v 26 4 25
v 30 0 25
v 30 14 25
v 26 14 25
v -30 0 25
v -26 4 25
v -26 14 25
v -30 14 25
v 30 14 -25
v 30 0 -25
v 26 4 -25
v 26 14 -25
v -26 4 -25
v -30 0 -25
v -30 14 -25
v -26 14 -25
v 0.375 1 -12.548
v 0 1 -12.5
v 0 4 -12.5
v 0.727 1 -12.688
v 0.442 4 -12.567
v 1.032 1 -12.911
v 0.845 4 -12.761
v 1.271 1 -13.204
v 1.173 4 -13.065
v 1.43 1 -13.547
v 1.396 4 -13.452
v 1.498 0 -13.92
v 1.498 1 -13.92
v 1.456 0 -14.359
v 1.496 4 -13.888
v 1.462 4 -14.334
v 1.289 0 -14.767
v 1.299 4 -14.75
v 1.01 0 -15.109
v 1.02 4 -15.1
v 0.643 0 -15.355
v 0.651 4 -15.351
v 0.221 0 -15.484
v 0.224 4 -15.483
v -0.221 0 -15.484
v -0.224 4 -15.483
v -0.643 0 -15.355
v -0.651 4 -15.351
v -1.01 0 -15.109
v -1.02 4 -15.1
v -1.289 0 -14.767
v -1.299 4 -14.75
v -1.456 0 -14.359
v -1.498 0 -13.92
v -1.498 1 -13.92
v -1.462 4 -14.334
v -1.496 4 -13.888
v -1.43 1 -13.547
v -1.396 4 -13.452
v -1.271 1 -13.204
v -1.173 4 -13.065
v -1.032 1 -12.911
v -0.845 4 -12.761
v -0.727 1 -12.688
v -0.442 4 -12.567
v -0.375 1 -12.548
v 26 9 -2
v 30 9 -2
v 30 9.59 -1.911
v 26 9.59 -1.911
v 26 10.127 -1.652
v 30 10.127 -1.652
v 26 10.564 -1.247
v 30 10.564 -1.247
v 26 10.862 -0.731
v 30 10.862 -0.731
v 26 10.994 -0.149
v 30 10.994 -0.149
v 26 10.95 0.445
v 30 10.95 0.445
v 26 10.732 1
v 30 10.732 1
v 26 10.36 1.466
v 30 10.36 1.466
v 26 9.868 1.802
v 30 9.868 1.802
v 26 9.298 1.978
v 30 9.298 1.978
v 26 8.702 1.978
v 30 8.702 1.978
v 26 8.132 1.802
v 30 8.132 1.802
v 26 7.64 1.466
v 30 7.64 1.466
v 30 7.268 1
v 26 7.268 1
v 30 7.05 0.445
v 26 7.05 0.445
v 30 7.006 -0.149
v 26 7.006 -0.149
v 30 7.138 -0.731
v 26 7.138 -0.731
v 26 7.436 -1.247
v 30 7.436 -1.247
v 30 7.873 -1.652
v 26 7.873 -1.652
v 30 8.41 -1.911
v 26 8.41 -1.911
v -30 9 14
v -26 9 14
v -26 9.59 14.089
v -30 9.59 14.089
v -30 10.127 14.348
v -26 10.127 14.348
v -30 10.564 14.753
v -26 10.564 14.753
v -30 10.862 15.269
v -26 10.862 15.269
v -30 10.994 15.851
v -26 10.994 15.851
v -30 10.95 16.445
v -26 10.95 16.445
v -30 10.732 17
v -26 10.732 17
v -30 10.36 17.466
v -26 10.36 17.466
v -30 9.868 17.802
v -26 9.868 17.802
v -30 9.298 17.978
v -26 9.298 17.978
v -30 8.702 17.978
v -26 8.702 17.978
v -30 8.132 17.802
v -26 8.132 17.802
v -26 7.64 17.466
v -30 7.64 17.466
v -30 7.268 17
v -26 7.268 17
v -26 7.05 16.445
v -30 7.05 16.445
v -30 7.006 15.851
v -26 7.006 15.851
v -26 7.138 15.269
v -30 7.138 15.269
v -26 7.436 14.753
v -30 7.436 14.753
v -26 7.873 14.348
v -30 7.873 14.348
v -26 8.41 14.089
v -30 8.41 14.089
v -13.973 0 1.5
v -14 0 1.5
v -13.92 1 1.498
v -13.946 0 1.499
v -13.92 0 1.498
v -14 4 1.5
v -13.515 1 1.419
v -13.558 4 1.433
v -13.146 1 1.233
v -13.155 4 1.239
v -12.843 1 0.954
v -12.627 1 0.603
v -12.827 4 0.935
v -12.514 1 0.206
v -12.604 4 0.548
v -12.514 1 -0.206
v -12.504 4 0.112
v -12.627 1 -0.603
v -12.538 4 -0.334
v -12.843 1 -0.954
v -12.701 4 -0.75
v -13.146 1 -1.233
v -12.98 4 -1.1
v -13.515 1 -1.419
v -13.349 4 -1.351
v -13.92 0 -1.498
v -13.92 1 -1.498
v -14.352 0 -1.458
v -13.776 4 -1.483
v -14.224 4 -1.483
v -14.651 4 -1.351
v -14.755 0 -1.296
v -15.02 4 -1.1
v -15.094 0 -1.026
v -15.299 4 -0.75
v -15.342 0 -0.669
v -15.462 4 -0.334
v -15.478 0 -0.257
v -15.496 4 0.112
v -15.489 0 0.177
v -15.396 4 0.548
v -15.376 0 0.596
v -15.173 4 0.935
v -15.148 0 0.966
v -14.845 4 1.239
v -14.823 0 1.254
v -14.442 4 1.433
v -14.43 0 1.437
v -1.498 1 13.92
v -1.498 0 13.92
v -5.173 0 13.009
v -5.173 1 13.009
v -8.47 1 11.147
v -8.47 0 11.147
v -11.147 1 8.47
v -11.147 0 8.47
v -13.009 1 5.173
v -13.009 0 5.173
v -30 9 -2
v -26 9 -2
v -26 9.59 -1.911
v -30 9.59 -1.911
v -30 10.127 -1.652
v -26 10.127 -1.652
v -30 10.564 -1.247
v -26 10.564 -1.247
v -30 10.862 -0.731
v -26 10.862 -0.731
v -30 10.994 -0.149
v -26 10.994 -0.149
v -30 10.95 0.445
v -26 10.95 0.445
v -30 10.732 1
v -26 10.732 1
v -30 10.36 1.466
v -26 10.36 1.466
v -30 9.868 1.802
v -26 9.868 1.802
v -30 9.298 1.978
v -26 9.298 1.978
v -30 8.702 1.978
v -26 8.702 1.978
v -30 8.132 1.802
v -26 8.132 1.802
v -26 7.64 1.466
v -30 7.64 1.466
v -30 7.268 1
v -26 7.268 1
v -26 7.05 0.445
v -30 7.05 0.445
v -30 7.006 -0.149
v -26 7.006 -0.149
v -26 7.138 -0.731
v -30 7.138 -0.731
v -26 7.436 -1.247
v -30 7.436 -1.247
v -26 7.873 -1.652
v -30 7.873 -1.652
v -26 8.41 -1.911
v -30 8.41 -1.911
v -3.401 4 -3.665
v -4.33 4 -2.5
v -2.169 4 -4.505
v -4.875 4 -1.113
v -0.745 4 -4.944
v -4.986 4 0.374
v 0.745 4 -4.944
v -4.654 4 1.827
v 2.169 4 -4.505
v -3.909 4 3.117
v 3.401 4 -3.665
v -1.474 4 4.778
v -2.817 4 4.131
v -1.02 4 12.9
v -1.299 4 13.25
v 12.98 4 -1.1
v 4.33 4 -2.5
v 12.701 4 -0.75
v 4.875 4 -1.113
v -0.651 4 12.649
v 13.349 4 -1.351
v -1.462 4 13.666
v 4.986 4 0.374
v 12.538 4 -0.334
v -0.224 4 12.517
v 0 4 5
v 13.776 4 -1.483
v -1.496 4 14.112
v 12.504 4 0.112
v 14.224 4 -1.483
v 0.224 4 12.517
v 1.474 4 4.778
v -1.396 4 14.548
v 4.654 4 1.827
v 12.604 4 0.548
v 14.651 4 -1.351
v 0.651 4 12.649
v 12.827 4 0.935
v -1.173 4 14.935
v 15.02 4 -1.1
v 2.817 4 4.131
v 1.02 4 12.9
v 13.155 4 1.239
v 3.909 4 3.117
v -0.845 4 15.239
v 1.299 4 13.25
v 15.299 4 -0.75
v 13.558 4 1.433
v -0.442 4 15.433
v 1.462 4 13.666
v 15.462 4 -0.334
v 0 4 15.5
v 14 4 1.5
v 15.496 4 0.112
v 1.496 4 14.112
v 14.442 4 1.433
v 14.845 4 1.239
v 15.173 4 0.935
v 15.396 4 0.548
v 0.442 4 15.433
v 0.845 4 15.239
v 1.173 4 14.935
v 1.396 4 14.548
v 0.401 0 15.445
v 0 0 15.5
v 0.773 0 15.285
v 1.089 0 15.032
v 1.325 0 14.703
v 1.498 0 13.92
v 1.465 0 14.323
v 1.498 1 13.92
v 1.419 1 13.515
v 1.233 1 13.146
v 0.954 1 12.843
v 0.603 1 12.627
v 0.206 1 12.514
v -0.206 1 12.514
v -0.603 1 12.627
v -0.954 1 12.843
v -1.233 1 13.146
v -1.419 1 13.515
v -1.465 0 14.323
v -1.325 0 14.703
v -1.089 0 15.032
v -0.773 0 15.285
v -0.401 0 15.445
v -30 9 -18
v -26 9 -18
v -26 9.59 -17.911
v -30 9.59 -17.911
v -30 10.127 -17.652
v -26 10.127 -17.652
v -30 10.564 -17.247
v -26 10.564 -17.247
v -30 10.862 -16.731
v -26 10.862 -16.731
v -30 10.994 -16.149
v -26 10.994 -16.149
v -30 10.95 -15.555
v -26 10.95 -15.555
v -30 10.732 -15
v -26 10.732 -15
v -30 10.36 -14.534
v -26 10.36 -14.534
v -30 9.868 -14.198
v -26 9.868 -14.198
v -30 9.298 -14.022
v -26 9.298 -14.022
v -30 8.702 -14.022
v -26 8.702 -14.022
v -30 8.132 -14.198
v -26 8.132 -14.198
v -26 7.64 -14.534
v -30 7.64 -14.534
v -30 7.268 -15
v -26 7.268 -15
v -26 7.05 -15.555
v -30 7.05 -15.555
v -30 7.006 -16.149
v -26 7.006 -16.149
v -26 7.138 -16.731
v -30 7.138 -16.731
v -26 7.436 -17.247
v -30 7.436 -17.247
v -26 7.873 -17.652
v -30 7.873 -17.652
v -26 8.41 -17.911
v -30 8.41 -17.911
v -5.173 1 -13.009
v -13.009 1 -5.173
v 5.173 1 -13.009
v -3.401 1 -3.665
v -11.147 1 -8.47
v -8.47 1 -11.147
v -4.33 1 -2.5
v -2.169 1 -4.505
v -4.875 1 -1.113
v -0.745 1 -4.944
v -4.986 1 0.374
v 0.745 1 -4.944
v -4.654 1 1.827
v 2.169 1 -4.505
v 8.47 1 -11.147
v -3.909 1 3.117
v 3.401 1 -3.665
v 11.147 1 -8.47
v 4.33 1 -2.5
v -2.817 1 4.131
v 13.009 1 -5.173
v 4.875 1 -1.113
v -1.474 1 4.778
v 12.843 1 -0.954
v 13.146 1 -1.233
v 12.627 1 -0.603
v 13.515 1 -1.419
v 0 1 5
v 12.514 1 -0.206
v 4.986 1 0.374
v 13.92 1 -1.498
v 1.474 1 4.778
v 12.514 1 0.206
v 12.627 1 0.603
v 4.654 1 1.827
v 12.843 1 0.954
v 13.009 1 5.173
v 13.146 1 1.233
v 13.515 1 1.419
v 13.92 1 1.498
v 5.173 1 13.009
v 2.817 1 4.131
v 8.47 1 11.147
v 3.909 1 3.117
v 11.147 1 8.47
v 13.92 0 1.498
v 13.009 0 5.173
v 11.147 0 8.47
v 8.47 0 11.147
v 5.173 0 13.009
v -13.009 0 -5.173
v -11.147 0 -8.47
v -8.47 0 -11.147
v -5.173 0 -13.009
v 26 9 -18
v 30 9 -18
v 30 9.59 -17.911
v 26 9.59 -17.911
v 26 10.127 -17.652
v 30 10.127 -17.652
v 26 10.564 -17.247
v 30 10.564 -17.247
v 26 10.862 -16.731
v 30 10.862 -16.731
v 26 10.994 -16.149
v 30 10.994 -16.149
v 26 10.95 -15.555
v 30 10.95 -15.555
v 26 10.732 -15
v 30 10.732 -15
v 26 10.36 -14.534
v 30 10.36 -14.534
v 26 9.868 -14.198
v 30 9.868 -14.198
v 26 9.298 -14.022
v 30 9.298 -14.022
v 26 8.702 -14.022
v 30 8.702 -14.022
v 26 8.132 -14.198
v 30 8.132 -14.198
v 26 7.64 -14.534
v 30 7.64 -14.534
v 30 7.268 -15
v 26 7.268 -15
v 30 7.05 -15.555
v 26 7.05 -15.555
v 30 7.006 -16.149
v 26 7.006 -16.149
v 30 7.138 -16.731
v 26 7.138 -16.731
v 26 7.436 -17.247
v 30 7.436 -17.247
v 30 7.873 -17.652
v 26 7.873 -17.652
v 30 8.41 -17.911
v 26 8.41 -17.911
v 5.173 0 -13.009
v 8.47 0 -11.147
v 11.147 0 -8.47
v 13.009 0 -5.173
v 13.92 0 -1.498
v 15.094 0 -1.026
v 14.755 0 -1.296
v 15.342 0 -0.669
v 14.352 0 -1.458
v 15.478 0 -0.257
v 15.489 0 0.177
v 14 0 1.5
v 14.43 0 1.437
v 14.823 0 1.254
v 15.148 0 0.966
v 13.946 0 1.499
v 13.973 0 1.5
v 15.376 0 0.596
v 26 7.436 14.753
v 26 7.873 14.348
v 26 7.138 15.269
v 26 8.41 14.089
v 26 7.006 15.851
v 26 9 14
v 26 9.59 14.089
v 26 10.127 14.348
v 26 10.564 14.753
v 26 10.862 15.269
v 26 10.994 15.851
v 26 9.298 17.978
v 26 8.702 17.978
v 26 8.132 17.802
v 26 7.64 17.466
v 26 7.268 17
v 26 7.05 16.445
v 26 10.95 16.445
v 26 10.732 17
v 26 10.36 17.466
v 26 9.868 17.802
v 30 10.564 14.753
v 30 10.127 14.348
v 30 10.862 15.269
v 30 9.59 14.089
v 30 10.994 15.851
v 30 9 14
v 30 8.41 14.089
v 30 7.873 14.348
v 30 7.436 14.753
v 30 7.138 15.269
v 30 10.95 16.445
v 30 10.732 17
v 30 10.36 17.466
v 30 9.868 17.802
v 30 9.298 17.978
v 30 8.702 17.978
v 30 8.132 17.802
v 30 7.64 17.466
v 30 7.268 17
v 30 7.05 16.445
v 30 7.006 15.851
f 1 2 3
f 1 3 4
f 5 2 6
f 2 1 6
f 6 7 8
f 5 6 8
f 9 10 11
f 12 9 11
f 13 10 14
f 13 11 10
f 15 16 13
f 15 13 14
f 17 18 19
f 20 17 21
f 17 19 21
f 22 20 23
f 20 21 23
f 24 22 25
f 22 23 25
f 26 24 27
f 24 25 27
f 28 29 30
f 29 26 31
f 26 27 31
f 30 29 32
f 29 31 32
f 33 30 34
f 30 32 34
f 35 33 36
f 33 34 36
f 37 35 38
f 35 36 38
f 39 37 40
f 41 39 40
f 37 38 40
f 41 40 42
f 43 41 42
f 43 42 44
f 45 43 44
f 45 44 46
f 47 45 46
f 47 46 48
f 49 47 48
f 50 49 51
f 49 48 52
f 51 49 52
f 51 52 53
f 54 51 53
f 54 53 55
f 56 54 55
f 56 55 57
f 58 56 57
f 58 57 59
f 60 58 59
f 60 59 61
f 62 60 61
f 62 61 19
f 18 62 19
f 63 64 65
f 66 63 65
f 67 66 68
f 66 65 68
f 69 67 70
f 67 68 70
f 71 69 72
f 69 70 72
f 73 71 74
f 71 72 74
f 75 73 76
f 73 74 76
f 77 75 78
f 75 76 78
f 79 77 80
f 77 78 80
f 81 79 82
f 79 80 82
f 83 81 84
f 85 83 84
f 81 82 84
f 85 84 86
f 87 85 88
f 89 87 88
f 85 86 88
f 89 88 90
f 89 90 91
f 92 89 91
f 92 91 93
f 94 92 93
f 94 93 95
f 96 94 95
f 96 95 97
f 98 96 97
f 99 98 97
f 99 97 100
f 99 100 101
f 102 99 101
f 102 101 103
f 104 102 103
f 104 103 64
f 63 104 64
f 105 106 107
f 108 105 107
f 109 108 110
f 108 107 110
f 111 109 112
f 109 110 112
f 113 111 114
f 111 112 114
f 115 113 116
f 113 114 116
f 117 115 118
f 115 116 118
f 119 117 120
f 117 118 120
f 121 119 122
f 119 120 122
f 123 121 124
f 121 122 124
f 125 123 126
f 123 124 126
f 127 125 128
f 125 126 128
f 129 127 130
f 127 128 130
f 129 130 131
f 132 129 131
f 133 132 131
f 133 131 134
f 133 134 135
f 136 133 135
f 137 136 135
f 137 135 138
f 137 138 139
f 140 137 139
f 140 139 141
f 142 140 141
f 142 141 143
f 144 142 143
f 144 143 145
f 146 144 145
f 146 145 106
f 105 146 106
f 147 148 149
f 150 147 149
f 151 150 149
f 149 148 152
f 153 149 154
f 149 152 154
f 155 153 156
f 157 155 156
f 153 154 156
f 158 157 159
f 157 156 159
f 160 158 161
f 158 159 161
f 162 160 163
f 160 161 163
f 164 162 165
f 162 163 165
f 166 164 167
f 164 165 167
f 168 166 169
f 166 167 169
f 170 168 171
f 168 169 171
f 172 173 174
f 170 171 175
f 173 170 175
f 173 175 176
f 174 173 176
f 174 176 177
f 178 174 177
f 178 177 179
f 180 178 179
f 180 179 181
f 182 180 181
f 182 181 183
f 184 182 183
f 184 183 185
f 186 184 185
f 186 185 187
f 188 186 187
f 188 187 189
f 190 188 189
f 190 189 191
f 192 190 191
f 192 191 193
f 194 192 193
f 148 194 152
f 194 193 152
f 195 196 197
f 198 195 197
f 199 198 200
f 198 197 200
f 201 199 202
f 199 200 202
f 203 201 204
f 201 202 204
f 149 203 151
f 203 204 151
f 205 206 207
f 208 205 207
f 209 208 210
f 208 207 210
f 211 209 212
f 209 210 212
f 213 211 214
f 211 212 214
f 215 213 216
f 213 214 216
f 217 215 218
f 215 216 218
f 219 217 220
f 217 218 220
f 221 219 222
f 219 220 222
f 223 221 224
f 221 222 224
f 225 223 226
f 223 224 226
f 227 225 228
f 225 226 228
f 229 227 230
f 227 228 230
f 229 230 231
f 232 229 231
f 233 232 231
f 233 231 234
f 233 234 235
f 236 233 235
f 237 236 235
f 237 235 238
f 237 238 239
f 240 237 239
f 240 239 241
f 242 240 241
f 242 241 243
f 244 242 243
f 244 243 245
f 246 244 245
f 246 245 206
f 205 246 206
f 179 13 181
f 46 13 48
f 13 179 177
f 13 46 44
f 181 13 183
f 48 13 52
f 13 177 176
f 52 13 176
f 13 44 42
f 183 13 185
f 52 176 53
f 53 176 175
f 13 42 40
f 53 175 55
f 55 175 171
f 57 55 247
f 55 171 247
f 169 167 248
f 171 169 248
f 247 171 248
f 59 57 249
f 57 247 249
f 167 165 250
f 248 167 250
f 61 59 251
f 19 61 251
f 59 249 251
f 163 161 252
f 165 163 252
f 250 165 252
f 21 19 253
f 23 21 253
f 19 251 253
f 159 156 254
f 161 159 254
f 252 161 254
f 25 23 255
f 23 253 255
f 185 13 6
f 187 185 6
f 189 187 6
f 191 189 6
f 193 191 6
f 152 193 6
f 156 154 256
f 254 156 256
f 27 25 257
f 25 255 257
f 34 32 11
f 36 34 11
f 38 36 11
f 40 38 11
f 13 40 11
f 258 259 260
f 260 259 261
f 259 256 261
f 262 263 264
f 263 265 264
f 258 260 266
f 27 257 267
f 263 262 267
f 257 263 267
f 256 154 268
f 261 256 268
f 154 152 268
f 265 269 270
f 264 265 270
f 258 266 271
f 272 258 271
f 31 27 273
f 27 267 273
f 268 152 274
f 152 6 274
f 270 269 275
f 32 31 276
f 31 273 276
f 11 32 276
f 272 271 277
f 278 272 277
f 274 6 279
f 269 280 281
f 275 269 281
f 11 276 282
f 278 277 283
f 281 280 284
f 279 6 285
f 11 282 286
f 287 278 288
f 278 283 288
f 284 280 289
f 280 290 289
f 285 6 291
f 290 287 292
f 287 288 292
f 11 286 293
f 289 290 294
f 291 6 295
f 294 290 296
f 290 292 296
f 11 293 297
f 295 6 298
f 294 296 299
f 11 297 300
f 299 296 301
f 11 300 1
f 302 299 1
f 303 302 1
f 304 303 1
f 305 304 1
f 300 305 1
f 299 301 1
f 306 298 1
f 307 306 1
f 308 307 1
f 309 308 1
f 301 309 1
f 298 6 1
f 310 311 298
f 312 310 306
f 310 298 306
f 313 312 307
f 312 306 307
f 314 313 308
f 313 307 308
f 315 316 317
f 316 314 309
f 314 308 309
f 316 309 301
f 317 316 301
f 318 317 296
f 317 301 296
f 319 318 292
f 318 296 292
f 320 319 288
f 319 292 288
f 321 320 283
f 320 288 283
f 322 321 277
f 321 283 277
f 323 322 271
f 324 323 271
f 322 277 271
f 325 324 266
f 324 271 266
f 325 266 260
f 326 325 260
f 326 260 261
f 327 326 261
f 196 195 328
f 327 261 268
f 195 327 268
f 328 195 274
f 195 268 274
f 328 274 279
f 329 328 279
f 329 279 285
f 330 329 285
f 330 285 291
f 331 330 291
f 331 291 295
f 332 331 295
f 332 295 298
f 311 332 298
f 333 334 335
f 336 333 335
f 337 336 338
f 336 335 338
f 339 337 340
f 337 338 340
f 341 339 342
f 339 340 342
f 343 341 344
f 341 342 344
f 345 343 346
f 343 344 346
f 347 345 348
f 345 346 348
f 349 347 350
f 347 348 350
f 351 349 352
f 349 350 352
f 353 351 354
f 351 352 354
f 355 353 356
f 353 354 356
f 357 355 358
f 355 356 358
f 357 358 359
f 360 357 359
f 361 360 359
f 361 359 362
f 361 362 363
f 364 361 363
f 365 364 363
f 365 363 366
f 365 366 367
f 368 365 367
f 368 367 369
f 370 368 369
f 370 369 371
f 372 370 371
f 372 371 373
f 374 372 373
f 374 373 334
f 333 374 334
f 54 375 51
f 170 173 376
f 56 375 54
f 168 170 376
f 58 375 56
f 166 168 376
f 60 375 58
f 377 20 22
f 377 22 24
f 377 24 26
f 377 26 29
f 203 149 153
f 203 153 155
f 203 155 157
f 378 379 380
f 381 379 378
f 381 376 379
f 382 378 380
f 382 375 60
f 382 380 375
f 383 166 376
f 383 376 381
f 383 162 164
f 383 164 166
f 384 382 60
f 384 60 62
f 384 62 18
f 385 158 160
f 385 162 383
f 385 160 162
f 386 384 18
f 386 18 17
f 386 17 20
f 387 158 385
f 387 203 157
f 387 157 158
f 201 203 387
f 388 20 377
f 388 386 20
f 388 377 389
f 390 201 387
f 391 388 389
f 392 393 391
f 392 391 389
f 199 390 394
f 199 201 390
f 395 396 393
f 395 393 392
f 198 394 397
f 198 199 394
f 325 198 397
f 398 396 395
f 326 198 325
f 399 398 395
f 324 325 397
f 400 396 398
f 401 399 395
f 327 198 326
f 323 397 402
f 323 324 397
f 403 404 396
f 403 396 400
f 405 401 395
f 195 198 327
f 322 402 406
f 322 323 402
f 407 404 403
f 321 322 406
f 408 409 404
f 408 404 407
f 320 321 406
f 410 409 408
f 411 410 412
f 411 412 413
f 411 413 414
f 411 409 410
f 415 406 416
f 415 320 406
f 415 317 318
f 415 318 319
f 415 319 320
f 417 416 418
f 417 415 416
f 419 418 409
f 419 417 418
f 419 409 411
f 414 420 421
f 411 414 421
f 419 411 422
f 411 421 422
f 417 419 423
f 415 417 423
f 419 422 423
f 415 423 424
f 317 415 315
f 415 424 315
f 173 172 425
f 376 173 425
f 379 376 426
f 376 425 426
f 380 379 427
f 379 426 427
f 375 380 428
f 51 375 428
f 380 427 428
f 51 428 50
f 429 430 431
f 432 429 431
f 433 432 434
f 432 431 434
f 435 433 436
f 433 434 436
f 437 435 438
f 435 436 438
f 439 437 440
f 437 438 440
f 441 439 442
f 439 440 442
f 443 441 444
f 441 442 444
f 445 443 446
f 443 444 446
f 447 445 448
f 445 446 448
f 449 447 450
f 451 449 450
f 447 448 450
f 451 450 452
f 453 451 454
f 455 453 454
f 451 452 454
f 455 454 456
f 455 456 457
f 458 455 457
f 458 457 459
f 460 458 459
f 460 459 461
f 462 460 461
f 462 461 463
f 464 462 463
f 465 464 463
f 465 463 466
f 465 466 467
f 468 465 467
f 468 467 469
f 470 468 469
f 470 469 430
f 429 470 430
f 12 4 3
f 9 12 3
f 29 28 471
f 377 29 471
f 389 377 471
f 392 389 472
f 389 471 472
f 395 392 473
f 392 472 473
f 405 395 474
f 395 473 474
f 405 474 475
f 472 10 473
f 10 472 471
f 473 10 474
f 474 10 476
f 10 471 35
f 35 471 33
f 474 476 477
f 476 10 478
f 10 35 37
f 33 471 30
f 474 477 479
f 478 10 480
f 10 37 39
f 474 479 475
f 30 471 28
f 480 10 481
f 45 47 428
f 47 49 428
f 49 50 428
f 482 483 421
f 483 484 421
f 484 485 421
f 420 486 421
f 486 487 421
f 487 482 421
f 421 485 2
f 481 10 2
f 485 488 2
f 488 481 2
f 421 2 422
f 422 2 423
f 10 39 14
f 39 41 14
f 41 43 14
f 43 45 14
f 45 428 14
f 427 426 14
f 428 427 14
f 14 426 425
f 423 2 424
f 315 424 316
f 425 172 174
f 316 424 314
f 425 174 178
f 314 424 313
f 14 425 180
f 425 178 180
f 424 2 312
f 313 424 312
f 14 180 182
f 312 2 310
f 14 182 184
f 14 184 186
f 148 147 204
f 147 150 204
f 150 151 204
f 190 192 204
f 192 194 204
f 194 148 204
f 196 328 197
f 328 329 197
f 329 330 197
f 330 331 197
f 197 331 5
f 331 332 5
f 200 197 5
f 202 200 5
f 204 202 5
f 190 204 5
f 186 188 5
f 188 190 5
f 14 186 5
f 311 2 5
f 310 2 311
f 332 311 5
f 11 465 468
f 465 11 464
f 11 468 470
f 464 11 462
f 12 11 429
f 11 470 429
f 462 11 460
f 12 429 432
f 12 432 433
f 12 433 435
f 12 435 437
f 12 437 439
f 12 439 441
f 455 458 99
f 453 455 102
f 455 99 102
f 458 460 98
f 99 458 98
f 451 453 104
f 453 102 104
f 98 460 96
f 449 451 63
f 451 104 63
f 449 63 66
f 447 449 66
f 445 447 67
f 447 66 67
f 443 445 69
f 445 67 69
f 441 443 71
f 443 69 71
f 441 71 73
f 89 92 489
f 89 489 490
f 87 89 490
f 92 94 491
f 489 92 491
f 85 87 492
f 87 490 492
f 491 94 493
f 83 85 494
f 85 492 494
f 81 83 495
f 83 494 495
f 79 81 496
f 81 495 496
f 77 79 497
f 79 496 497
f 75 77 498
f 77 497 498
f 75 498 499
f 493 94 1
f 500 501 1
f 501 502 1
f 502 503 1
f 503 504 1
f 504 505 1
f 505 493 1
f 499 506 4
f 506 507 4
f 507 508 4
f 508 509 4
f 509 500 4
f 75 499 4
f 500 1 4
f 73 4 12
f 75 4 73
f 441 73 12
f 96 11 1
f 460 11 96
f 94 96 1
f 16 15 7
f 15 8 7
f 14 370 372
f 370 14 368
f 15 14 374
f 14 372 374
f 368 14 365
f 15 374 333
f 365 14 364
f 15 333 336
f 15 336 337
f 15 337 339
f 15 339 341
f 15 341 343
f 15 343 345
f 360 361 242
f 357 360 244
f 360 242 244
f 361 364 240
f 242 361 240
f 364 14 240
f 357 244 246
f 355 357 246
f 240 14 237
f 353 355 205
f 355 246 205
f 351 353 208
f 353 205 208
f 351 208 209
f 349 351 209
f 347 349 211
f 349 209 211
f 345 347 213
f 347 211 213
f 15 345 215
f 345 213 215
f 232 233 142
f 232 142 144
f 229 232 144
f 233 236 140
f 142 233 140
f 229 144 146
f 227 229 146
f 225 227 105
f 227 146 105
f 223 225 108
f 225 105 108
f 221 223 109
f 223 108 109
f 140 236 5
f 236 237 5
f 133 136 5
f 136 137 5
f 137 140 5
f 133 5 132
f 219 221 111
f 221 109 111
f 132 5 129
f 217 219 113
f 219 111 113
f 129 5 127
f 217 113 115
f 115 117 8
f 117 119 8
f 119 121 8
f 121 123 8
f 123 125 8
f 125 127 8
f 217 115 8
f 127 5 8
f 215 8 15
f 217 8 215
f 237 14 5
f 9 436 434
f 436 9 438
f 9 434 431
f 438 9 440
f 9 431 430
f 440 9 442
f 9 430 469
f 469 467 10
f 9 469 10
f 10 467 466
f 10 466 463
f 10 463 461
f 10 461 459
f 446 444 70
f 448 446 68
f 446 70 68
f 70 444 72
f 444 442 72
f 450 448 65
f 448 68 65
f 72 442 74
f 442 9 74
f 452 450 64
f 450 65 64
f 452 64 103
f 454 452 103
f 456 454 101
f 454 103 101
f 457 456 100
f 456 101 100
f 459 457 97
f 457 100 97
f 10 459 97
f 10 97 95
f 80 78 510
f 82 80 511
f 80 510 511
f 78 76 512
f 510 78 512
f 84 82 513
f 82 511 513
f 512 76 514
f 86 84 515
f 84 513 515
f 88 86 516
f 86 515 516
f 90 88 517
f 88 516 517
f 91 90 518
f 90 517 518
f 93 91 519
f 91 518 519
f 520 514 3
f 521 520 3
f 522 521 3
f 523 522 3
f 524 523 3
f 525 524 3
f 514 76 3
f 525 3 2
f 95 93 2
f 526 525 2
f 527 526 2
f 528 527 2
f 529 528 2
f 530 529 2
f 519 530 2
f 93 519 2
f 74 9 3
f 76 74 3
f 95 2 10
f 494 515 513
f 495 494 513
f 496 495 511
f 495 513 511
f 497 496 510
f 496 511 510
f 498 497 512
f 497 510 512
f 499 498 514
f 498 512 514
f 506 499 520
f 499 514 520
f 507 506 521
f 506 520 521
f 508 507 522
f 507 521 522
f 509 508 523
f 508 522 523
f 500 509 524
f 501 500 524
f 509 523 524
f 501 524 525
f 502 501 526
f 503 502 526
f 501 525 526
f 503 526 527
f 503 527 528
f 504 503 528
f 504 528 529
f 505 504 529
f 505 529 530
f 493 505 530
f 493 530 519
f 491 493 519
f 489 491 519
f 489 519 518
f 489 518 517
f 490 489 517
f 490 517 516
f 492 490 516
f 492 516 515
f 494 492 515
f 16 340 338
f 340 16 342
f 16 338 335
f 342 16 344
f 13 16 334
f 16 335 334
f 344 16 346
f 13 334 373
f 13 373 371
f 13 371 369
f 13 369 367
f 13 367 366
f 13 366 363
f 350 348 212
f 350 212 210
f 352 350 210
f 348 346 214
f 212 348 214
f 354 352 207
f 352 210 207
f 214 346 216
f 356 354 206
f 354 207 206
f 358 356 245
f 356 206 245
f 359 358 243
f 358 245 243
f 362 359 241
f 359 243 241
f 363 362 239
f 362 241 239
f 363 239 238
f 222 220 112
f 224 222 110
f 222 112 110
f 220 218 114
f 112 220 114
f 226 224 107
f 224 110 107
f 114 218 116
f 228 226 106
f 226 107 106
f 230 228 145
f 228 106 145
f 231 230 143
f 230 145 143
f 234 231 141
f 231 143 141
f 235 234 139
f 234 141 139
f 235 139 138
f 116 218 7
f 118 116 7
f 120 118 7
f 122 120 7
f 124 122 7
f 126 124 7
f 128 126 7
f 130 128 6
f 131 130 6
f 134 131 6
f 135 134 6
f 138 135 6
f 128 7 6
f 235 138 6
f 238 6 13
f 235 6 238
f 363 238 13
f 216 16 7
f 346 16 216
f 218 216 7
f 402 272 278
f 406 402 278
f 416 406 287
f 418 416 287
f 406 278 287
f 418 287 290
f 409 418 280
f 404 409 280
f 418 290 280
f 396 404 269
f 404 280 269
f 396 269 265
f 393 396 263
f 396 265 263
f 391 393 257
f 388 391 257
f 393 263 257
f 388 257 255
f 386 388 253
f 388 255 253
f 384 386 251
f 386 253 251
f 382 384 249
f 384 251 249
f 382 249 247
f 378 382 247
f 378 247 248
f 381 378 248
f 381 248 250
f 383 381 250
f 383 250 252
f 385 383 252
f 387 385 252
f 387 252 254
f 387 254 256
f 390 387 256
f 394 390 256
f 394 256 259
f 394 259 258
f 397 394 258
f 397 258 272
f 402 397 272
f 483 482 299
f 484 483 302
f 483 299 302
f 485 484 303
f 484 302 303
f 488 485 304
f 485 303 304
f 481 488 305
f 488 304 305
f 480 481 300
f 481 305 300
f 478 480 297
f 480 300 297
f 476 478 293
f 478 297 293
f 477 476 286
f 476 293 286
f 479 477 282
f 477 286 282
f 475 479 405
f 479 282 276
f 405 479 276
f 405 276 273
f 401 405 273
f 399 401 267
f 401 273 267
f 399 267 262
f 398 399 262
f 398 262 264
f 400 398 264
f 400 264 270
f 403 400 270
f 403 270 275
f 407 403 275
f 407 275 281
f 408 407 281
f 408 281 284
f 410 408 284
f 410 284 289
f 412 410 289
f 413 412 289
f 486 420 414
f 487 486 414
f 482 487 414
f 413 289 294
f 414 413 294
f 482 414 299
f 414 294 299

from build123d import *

# Parameters (mm, degrees)
EXTRUDE_1_DEPTH     = 25
SKETCH_3_R          = 5
SKETCH_3_R_2        = 1.5
CUT_EXTRUDE_2_DEPTH = 4
SKETCH_4_R          = 14
CUT_EXTRUDE_3_DEPTH = 1
SKETCH_2_R          = 2
CUT_EXTRUDE_4_DEPTH = 67.49060084


with BuildPart() as part:
    # 草图1 → 凸台-拉伸1 (new, symmetric)
    with BuildSketch(Plane.XY):
        Polygon((30, 0), (-30, 0), (-30, 14), (-26, 14), (-26, 4), (26, 4), (26, 14), (30, 14), align=None)
    extrude(amount=EXTRUDE_1_DEPTH, both=True)

    # 草图3 → 切除-拉伸2 (cut)
    with BuildSketch(Plane(origin=(0, 4, 0), x_dir=(1, 0, 0), z_dir=(0, 1, 0))):
        with Locations(Location((0, 0, 0), (0, 0, 270))):
            Circle(SKETCH_3_R)
        with Locations(Location((0, 14, 0), (0, 0, 270))):
            Circle(SKETCH_3_R_2)
        with Locations(Location((14, 0, 0), (0, 0, 270))):
            Circle(SKETCH_3_R_2)
        with Locations(Location((0, -14, 0), (0, 0, 270))):
            Circle(SKETCH_3_R_2)
        with Locations(Location((-14, 0, 0), (0, 0, 270))):
            Circle(SKETCH_3_R_2)
    extrude(amount=-CUT_EXTRUDE_2_DEPTH, mode=Mode.SUBTRACT)

    # 草图4 → 切除-拉伸3 (cut)
    with BuildSketch(Plane.XZ):
        Circle(SKETCH_4_R)
    extrude(amount=-CUT_EXTRUDE_3_DEPTH, mode=Mode.SUBTRACT)

    # 草图2 → 切除-拉伸4 (cut, through all)
    with BuildSketch(Plane(origin=(30, 0, 0), x_dir=(0, 0, -1), z_dir=(1, 0, 0))):
        with Locations((-16, 9)):
            Circle(SKETCH_2_R)
        with Locations((0, 9)):
            Circle(SKETCH_2_R)
        with Locations((16, 9)):
            Circle(SKETCH_2_R)
    extrude(amount=-CUT_EXTRUDE_4_DEPTH, mode=Mode.SUBTRACT)


solid = part.part
